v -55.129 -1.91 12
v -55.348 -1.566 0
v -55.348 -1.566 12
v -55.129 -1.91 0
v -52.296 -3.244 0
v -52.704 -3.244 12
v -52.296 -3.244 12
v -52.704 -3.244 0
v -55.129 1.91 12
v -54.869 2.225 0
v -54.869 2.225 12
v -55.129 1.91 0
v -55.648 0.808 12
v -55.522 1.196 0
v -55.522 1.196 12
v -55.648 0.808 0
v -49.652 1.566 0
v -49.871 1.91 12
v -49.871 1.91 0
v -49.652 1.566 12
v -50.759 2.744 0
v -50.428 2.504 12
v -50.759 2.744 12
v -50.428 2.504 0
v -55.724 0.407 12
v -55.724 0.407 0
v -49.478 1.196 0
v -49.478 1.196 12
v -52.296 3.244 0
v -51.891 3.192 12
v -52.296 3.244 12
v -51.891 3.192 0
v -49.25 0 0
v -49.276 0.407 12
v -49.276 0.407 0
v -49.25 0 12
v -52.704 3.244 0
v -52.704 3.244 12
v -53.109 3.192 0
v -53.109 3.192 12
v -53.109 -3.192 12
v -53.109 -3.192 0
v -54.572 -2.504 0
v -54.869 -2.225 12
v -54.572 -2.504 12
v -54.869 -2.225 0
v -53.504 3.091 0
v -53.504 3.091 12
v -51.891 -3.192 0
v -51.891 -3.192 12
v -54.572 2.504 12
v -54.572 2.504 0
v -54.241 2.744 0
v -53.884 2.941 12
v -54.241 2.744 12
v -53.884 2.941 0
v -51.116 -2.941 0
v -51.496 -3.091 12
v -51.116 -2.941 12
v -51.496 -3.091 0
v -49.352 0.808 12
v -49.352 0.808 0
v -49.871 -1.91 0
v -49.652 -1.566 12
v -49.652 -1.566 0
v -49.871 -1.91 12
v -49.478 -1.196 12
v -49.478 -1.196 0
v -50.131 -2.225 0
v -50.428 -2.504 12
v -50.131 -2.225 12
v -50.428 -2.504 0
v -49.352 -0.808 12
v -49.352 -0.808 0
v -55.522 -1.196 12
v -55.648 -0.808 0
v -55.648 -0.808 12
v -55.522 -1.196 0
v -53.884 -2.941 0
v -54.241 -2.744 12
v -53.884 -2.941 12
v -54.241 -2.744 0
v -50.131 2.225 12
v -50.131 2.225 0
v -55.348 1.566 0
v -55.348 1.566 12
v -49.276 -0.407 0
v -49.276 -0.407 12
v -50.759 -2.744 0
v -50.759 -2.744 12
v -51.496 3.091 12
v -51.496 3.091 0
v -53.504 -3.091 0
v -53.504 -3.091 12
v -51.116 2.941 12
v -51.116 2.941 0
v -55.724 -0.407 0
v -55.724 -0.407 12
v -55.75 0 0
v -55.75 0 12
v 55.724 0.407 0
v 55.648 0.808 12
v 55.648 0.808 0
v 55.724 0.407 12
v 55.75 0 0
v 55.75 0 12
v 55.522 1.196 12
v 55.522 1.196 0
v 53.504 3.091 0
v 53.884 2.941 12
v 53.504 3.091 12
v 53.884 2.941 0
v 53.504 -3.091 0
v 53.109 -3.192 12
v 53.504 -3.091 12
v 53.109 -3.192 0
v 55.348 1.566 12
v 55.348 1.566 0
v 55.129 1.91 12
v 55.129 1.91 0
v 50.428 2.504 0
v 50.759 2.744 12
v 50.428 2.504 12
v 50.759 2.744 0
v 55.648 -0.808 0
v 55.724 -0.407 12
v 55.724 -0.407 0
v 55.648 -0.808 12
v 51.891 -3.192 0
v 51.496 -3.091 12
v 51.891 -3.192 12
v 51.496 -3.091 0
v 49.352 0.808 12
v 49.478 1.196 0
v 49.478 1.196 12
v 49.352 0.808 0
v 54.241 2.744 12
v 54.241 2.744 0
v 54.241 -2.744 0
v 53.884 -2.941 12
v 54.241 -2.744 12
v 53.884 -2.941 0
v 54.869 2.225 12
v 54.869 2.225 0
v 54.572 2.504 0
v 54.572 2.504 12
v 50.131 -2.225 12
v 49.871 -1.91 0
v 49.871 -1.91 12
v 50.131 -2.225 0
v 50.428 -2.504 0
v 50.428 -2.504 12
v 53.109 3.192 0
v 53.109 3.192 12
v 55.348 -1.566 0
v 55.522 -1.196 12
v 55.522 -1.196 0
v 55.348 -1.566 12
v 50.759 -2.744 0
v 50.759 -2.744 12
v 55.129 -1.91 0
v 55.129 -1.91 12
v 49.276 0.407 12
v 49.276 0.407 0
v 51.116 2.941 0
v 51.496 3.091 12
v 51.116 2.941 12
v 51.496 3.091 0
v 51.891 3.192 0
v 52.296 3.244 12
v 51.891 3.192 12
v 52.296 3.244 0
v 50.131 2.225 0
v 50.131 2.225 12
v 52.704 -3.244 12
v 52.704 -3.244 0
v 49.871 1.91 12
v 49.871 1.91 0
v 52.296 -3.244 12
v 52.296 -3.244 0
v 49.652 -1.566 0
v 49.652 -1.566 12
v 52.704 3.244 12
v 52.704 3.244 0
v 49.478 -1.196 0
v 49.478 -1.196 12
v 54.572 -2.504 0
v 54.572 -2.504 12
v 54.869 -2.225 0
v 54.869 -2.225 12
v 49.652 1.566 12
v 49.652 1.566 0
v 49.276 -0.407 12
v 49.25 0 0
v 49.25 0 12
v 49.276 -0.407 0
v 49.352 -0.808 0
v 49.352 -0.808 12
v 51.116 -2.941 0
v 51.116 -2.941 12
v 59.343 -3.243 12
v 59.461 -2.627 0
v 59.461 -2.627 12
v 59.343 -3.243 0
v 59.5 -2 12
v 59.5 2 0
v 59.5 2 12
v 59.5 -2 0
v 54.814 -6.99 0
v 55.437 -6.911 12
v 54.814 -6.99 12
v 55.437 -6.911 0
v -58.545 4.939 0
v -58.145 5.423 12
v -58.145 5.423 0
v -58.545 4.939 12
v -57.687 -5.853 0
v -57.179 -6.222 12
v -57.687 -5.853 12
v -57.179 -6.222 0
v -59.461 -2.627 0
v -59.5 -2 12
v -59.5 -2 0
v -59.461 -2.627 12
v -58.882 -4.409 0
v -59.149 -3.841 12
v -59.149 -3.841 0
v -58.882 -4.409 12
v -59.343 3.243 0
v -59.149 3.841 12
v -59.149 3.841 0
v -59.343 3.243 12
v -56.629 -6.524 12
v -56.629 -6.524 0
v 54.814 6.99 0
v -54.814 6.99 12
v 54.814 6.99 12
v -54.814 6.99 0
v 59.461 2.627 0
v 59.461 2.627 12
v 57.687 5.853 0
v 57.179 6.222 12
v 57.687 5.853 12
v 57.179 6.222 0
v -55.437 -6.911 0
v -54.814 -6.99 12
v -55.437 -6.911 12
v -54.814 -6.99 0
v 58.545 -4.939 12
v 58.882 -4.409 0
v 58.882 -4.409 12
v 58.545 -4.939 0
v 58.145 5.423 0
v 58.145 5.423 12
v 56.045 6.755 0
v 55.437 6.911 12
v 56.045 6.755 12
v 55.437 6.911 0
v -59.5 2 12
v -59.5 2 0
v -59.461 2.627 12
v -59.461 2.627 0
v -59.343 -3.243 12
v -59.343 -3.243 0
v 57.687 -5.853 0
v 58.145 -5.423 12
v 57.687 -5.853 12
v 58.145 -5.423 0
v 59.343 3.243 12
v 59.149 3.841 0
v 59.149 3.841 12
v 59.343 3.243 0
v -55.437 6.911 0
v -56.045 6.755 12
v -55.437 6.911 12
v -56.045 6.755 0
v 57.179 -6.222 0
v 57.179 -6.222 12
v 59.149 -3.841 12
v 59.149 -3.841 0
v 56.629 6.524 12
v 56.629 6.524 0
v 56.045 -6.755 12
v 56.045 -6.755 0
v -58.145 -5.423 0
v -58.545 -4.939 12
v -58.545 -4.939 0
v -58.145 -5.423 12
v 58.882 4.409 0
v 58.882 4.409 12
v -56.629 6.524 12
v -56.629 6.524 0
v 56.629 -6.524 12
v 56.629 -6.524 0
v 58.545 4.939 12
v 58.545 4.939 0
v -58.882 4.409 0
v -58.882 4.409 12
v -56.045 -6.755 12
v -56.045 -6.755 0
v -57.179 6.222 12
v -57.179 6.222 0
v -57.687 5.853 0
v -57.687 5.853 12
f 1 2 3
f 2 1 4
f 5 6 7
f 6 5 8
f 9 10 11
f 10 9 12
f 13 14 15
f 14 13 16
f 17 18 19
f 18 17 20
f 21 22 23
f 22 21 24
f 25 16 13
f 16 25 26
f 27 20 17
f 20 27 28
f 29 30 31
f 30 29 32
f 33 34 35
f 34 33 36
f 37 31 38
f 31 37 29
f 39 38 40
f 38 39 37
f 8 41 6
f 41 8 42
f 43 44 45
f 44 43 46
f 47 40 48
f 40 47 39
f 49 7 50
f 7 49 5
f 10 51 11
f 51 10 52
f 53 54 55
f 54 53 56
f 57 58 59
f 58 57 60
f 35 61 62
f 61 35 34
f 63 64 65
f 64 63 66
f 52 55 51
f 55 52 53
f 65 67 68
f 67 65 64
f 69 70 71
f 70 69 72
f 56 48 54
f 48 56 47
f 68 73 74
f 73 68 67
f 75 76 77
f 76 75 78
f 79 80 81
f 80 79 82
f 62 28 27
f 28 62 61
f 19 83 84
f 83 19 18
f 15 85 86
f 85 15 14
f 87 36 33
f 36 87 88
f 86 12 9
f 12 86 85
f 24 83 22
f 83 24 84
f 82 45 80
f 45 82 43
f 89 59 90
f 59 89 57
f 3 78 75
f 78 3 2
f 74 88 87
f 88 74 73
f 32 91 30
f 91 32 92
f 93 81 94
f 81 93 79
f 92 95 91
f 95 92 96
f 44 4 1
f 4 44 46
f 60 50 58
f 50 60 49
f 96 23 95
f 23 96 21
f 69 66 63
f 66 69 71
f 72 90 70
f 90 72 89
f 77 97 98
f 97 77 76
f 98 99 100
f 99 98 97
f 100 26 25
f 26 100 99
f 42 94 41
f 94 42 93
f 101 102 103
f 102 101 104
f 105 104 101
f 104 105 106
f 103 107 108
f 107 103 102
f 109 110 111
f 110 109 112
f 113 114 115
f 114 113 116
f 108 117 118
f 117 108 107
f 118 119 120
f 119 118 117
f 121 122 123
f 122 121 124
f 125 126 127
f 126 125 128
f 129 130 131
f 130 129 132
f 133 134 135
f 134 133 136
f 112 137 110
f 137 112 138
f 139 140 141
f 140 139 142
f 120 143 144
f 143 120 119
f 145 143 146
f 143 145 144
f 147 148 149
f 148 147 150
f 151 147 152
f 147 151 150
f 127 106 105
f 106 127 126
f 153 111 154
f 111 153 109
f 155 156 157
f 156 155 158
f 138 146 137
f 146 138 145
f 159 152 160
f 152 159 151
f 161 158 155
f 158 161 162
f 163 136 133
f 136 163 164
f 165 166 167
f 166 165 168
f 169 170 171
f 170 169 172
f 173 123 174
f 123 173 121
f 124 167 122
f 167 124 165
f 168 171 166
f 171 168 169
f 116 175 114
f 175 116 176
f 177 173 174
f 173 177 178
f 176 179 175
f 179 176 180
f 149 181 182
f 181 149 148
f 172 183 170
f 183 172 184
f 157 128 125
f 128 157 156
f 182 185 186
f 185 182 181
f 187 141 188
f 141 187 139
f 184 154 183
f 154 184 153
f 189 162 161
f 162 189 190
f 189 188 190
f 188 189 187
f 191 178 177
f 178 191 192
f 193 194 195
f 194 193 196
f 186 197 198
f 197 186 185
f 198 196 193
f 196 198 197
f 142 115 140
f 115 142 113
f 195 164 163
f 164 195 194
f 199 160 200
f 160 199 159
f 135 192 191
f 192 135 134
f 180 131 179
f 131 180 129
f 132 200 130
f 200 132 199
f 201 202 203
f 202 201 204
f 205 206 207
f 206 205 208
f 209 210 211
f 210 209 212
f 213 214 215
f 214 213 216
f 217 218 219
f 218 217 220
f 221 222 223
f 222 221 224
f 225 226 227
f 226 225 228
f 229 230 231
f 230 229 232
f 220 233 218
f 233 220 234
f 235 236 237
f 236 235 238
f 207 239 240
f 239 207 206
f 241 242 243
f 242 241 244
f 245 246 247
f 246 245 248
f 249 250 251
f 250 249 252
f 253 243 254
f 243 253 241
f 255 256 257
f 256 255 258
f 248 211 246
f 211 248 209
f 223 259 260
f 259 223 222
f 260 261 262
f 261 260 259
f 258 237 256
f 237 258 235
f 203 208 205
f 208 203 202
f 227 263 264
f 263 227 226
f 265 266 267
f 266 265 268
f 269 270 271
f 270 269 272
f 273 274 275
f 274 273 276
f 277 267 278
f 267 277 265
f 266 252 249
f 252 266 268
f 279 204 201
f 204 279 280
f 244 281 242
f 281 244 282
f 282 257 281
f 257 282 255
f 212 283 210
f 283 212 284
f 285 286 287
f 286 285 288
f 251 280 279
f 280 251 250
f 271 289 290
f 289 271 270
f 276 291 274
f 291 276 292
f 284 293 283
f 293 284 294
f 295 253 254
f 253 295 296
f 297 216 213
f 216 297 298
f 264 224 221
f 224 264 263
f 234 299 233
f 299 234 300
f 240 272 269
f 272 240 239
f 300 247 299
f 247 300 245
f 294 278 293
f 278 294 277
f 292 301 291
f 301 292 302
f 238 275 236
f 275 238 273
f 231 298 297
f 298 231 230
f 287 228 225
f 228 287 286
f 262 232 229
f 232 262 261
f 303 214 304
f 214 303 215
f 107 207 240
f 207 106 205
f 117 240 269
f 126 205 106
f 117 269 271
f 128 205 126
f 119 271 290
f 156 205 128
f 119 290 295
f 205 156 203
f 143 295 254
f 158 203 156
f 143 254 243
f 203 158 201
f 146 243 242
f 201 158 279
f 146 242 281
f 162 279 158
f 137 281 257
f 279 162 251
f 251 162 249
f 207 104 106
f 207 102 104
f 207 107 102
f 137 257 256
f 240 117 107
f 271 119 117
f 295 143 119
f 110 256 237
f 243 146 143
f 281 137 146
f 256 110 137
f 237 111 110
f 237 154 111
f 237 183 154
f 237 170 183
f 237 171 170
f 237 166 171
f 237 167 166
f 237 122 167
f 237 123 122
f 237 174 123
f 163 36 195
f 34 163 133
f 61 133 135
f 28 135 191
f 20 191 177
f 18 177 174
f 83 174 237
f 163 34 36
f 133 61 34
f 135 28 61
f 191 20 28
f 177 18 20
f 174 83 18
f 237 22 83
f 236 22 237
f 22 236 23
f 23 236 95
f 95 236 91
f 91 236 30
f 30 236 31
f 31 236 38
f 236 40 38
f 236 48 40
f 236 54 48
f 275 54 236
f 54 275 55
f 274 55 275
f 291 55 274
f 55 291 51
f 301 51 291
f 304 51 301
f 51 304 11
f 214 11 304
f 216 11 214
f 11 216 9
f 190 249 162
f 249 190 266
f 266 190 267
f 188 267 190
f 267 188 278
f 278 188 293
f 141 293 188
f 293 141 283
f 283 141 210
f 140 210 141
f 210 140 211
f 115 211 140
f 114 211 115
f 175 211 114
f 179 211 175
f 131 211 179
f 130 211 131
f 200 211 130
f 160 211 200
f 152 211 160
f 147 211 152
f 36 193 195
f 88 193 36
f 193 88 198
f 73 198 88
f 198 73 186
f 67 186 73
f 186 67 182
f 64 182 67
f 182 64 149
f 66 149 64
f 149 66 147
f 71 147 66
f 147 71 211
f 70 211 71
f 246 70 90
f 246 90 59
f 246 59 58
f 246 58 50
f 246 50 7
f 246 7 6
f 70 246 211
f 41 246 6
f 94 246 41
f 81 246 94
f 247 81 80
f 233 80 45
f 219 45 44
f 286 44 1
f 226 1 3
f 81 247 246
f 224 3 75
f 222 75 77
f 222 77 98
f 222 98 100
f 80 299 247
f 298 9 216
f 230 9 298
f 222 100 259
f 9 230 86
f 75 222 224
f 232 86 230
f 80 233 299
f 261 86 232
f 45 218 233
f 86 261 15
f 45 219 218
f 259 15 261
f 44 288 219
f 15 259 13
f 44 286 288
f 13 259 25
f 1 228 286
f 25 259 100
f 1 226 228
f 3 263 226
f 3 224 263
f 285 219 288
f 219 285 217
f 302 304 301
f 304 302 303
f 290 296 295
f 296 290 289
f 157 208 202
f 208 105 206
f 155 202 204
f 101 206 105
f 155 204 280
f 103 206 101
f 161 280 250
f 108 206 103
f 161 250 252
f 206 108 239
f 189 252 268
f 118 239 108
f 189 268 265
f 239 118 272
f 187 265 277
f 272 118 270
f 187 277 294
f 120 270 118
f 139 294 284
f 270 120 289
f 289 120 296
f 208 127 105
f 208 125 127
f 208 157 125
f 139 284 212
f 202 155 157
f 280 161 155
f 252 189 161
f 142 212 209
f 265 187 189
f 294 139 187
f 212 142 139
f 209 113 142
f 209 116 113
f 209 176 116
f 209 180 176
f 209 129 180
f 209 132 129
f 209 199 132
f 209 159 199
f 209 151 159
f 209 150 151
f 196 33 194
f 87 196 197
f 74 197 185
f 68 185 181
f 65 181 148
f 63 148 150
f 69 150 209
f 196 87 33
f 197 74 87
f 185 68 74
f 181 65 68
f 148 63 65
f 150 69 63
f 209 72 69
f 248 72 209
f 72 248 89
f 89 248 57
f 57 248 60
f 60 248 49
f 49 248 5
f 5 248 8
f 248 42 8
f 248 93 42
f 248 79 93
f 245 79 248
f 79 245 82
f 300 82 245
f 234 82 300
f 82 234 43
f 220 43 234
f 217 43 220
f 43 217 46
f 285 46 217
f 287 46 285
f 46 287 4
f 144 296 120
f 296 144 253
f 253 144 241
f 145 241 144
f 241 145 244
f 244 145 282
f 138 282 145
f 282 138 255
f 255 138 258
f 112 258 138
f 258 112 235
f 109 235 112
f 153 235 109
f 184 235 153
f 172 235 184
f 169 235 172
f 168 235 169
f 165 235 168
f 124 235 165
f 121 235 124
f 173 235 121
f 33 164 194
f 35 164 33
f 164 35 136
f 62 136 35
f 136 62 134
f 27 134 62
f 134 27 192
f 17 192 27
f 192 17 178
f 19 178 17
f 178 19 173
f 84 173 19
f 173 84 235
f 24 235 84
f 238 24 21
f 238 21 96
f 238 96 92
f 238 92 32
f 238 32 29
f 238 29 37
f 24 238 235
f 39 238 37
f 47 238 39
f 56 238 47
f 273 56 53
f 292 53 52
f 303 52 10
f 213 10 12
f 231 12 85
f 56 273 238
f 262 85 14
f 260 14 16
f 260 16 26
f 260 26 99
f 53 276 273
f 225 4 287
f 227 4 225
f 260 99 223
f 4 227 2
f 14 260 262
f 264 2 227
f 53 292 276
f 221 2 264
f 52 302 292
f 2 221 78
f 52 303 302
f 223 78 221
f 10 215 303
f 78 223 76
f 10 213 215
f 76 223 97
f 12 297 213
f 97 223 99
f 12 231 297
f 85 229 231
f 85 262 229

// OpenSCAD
$fn = 50;


difference() {
	union() {
		hull() {
			translate(v = [-54.5000000000, 2.0000000000, 0]) {
				cylinder(h = 12, r = 5);
			}
			translate(v = [54.5000000000, 2.0000000000, 0]) {
				cylinder(h = 12, r = 5);
			}
			translate(v = [-54.5000000000, -2.0000000000, 0]) {
				cylinder(h = 12, r = 5);
			}
			translate(v = [54.5000000000, -2.0000000000, 0]) {
				cylinder(h = 12, r = 5);
			}
		}
	}
	union() {
		translate(v = [-52.5000000000, 0.0000000000, -100.0000000000]) {
			cylinder(h = 200, r = 3.2500000000);
		}
		translate(v = [-52.5000000000, 0.0000000000, -100.0000000000]) {
			cylinder(h = 200, r = 3.2500000000);
		}
		translate(v = [52.5000000000, 0.0000000000, -100.0000000000]) {
			cylinder(h = 200, r = 3.2500000000);
		}
		translate(v = [52.5000000000, 0.0000000000, -100.0000000000]) {
			cylinder(h = 200, r = 3.2500000000);
		}
	}
}
